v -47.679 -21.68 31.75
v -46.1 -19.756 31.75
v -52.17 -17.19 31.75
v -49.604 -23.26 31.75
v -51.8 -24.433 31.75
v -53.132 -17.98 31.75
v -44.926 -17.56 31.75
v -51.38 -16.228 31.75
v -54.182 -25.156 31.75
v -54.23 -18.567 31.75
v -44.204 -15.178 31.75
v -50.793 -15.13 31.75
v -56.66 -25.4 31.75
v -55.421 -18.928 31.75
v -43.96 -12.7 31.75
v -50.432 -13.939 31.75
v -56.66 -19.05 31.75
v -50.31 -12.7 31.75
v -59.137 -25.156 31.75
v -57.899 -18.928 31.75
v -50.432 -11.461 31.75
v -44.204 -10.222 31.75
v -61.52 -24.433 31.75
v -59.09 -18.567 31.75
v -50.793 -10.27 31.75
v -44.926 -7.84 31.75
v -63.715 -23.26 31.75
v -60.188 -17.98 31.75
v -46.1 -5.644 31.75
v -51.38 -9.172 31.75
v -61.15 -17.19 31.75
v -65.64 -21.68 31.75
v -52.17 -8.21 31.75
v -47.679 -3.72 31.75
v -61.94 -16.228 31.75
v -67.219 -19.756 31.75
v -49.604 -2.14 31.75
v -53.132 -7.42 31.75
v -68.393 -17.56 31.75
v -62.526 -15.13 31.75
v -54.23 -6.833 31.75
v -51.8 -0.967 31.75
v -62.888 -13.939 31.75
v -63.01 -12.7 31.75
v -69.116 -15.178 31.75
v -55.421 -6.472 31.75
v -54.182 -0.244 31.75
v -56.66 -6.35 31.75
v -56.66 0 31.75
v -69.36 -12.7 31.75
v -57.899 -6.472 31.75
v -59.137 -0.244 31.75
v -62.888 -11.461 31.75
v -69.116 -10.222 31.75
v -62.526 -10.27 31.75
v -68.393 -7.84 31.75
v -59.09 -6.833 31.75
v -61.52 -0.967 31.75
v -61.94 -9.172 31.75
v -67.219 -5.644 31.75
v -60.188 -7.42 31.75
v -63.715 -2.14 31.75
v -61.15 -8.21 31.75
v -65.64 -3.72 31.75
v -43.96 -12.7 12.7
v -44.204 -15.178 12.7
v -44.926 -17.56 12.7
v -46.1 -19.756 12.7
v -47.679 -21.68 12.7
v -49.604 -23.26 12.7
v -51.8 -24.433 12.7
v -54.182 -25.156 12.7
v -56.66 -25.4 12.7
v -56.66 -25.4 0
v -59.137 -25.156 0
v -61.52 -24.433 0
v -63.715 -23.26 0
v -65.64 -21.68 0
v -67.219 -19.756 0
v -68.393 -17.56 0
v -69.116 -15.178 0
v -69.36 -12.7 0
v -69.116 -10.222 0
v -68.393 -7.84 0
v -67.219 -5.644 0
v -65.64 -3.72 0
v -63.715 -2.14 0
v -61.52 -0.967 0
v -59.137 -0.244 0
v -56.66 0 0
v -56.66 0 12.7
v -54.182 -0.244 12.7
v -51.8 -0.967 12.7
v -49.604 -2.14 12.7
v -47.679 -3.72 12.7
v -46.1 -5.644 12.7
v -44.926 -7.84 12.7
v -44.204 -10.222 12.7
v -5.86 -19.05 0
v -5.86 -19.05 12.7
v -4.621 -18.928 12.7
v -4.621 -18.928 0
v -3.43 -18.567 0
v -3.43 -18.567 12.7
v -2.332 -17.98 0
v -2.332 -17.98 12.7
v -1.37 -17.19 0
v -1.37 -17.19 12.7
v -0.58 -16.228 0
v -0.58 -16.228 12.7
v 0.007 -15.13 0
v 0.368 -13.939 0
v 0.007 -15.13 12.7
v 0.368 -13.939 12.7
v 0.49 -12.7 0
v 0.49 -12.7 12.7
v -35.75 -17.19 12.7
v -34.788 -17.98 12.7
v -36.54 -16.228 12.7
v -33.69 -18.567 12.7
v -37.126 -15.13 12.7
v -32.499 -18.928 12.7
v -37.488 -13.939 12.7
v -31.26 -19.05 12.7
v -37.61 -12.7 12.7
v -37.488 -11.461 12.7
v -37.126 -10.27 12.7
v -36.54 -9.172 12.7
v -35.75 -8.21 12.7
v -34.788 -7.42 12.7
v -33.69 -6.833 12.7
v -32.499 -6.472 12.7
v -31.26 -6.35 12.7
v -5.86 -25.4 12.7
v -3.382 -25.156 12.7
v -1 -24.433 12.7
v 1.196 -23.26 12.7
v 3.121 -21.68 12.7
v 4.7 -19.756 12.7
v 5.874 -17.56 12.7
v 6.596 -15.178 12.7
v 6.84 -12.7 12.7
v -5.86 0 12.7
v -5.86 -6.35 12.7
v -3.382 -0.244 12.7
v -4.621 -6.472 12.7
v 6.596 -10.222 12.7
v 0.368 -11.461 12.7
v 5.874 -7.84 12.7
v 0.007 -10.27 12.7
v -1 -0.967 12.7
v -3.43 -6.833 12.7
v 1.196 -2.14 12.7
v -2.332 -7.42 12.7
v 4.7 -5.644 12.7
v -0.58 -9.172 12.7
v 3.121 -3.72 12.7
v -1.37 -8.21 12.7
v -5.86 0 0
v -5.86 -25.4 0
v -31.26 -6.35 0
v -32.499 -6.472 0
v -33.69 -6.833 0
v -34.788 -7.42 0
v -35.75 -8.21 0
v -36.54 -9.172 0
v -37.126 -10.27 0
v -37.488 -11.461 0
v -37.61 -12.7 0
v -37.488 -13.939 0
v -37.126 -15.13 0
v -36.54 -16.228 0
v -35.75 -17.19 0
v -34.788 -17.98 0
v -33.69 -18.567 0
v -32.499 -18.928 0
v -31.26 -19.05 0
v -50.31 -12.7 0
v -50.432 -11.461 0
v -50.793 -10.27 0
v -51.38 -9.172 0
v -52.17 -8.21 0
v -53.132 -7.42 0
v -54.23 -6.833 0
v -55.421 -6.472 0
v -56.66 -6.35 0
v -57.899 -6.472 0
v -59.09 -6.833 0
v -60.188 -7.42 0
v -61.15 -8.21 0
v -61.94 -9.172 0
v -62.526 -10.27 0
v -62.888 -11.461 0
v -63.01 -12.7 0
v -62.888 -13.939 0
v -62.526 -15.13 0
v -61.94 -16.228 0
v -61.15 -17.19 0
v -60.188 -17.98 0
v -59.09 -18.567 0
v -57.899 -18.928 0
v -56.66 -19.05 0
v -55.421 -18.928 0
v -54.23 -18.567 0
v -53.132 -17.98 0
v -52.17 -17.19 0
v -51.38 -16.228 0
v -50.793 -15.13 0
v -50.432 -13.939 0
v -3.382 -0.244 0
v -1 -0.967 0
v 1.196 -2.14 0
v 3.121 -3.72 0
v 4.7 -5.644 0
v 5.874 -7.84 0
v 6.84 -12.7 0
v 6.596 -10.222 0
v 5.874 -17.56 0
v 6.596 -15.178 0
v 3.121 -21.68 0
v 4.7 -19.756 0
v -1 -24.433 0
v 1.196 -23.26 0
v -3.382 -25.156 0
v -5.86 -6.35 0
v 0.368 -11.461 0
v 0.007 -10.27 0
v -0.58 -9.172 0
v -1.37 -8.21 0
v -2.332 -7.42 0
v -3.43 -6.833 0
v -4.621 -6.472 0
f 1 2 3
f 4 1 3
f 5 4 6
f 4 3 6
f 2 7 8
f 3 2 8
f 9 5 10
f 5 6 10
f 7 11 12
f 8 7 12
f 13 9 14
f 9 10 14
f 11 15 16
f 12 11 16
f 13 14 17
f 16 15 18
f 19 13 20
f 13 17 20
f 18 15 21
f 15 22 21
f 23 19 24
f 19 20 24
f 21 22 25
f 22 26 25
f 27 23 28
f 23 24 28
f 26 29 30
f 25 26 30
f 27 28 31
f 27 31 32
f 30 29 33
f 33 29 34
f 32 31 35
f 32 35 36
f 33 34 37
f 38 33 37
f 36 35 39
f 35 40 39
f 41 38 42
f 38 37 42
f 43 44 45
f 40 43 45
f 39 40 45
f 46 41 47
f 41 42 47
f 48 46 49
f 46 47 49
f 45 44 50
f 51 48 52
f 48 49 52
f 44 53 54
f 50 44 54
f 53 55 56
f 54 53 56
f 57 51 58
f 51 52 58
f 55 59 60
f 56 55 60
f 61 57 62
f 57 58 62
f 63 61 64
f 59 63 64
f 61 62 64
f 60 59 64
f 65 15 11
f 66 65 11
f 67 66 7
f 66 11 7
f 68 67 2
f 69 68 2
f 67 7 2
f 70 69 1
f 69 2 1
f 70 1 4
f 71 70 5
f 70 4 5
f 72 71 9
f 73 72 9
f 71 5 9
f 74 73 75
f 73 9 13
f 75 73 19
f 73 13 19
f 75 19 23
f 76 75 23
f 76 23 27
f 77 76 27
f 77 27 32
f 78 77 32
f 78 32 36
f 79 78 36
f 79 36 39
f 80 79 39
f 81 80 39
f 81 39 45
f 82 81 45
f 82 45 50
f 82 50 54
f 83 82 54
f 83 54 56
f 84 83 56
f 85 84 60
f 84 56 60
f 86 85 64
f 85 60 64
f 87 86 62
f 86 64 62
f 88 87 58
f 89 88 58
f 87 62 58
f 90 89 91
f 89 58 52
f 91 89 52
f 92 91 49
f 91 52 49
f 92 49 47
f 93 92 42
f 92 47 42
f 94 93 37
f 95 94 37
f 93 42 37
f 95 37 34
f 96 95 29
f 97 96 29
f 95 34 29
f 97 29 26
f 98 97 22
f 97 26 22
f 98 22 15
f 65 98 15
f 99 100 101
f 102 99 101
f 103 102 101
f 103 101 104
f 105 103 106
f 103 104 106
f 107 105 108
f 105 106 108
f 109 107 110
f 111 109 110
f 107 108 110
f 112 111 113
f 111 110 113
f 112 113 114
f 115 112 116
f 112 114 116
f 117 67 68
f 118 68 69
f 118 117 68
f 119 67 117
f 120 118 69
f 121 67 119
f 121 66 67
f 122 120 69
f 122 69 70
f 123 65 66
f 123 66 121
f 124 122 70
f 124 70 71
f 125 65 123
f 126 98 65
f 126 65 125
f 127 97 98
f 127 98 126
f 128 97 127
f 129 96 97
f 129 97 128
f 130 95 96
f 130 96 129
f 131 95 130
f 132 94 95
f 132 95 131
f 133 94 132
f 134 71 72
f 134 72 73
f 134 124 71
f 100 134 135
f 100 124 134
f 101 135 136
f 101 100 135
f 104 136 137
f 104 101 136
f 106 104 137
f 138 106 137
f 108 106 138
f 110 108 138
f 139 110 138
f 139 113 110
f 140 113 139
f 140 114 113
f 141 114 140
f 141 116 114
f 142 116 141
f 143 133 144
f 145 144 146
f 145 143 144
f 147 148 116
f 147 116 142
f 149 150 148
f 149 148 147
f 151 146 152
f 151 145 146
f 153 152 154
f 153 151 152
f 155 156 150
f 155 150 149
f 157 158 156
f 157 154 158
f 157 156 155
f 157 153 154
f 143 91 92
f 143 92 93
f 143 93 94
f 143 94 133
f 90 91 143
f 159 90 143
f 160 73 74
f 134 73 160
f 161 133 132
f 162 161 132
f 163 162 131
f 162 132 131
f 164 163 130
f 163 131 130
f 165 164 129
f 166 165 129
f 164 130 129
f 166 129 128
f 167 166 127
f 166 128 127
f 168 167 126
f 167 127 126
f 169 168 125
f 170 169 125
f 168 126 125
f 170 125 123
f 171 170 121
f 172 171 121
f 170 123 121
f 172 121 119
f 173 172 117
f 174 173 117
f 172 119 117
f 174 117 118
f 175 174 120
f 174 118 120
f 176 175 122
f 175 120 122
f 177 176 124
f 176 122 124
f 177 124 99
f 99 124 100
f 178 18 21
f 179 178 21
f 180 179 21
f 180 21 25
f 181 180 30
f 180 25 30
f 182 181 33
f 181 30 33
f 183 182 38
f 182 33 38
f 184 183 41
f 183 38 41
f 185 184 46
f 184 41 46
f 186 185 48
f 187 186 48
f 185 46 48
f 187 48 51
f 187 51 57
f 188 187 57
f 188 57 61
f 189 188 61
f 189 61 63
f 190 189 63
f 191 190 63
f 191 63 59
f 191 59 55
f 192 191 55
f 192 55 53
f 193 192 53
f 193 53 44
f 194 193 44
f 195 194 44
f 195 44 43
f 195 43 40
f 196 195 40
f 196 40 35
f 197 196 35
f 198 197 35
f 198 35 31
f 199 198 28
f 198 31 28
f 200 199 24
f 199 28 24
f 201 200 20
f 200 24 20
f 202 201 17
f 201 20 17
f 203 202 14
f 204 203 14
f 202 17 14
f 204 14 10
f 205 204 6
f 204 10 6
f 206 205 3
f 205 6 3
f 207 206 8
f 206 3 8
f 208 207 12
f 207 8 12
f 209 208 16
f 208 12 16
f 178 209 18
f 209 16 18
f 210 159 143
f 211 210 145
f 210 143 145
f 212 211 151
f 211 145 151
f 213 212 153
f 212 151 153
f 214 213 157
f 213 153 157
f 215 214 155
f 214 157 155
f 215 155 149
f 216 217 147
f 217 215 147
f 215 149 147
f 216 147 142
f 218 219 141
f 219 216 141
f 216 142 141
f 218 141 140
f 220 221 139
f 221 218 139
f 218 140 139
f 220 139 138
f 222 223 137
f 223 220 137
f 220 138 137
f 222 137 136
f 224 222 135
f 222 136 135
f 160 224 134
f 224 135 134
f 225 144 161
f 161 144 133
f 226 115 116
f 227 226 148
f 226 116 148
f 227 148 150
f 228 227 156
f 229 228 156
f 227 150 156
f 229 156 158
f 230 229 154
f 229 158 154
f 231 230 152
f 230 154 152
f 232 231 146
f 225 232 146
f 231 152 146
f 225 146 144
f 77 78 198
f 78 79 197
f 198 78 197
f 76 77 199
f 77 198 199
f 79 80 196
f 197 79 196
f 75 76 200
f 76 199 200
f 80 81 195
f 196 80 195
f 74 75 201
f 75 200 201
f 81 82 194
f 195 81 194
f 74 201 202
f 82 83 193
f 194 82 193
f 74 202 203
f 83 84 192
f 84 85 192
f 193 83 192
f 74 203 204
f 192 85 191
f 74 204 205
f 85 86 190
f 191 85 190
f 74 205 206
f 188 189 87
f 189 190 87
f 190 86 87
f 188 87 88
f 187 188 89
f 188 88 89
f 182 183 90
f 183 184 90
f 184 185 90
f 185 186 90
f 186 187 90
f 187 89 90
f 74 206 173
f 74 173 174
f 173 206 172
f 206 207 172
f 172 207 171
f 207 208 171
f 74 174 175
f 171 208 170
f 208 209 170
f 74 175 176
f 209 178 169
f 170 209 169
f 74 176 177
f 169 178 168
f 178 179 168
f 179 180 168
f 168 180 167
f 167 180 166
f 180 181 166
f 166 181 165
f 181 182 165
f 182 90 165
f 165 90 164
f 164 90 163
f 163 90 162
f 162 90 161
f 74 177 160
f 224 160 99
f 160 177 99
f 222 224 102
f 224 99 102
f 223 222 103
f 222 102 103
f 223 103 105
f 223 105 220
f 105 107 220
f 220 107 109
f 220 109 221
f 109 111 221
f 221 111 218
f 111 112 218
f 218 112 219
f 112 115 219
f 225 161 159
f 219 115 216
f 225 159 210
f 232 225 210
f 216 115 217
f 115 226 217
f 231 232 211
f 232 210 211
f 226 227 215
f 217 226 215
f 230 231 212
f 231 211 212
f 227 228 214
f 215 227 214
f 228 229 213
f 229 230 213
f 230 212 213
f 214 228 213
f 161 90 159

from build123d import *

# Parameters (mm, degrees)
F1_DEPTH  = 25.4
F2_R      = 6.35
F3_DEPTH  = 38.1
F5_DEPTH  = 25.4
F7_DEPTH  = 25.4
F8_DEPTH  = 25.4
F9_DEPTH  = 25.4
F11_DEPTH = 25.4
F12_DEPTH = 19.05


with BuildPart() as f1:
    # F0 (on Front) → F1 (new body)
    with BuildSketch(Plane.XZ):
        Polygon((-37.6096788886, 50.8), (-75.7096788886, 50.8), (-75.7096788886, 0), (13.1903211114, 0), (13.1903211114, 12.7), (-37.6096788886, 12.7), align=None)
    extrude(amount=F1_DEPTH)

    # F2 (on face) → F3 (cut)
    with BuildSketch(Plane.XY.offset(50.8)):
        with BuildLine():
            ThreePointArc((-56.6596788886, 0), (-47.6794227675, -3.7197438789), (-43.9596788886, -12.7))
            ThreePointArc((-43.9596788886, -12.7), (-47.6794227675, -21.6802561211), (-56.6596788886, -25.4))
            Line((-56.6596788886, -25.4), (-37.6096788886, -25.4))
            Line((-37.6096788886, -25.4), (-37.6096788886, 0))
            Line((-37.6096788886, 0), (-56.6596788886, 0))
        make_face()
        with Locations((-56.6596788886, -12.7)):
            Circle(F2_R)
    extrude(amount=-F3_DEPTH, mode=Mode.SUBTRACT)

    # F4 (on face) → F5 (cut)
    with BuildSketch(Plane.XZ.offset(25.4)):
        with BuildLine():
            ThreePointArc((-74.1441026044, 0), (-75.2174849859, 1.8027068987), (-75.7096788886, 3.842228181))
            Line((-75.7096788886, 3.842228181), (-75.7096788886, 0))
            Line((-75.7096788886, 0), (-74.1441026044, 0))
        make_face()
    extrude(amount=-F5_DEPTH, mode=Mode.SUBTRACT)

    # F6 (on face) → F7 (cut)
    with BuildSketch(Plane.XY.offset(50.8)):
        with BuildLine():
            ThreePointArc((-56.6596788886, -25.4), (-69.3596788886, -12.7), (-56.6596788886, 0))
            Line((-56.6596788886, 0), (-75.7096788886, 0))
            Line((-75.7096788886, 0), (-75.7096788886, -25.4))
            Line((-75.7096788886, -25.4), (-56.6596788886, -25.4))
        make_face()
    extrude(amount=-F7_DEPTH, mode=Mode.SUBTRACT)

    # F8 (cut): a face of the model
    f8_faces = [f1.faces().sort_by_distance(p)[0] for p in [
        (-70.7292854187, -12.7, 25.4),
    ]]
    extrude(f8_faces, amount=-F8_DEPTH, mode=Mode.SUBTRACT)

    # F9 (cut): a face of the model
    f9_faces = [f1.faces().sort_by_distance(p)[0] for p in [
        (-56.6596788886, -12.7, 12.7),
    ]]
    extrude(f9_faces, amount=-F9_DEPTH, mode=Mode.SUBTRACT)

    # F10 (on face) → F11 (cut)
    with BuildSketch(Plane.XY.offset(12.7)):
        with BuildLine():
            ThreePointArc((-31.2596788886, -19.05), (-26.7695508281, -17.1901280605), (-24.9096788886, -12.7))
            ThreePointArc((-24.9096788886, -12.7), (-26.7695508281, -8.2098719395), (-31.2596788886, -6.35))
            ThreePointArc((-31.2596788886, -6.35), (-37.6096788886, -12.7), (-31.2596788886, -19.05))
        make_face()
        with BuildLine():
            ThreePointArc((-31.2596788886, -6.35), (-26.7695508281, -8.2098719395), (-24.9096788886, -12.7))
            ThreePointArc((-24.9096788886, -12.7), (-26.7695508281, -17.1901280605), (-31.2596788886, -19.05))
            Line((-31.2596788886, -19.05), (-5.8596788886, -19.05))
            ThreePointArc((-5.8596788886, -19.05), (-12.2096788886, -12.7), (-5.8596788886, -6.35))
            Line((-5.8596788886, -6.35), (-31.2596788886, -6.35))
        make_face()
        with BuildLine():
            ThreePointArc((0.4903211114, -12.7), (-1.3695508281, -8.2098719395), (-5.8596788886, -6.35))
            ThreePointArc((-5.8596788886, -6.35), (-12.2096788886, -12.7), (-5.8596788886, -19.05))
            ThreePointArc((-5.8596788886, -19.05), (-1.3695508281, -17.1901280605), (0.4903211114, -12.7))
        make_face()
        with BuildLine():
            ThreePointArc((-5.8596788886, 0), (6.8403211114, -12.7), (-5.8596788886, -25.4))
            Line((-5.8596788886, -25.4), (13.1903211114, -25.4))
            Line((13.1903211114, -25.4), (13.1903211114, 0))
            Line((13.1903211114, 0), (-5.8596788886, 0))
        make_face()
    extrude(amount=-F11_DEPTH, mode=Mode.SUBTRACT)

    # F12 (cut): a face of the model
    f12_faces = [f1.faces().sort_by_distance(p)[0] for p in [
        (-56.6596788886, -0.3592102448, 50.8),
    ]]
    extrude(f12_faces, amount=-F12_DEPTH, mode=Mode.SUBTRACT)


solid = f1.part
